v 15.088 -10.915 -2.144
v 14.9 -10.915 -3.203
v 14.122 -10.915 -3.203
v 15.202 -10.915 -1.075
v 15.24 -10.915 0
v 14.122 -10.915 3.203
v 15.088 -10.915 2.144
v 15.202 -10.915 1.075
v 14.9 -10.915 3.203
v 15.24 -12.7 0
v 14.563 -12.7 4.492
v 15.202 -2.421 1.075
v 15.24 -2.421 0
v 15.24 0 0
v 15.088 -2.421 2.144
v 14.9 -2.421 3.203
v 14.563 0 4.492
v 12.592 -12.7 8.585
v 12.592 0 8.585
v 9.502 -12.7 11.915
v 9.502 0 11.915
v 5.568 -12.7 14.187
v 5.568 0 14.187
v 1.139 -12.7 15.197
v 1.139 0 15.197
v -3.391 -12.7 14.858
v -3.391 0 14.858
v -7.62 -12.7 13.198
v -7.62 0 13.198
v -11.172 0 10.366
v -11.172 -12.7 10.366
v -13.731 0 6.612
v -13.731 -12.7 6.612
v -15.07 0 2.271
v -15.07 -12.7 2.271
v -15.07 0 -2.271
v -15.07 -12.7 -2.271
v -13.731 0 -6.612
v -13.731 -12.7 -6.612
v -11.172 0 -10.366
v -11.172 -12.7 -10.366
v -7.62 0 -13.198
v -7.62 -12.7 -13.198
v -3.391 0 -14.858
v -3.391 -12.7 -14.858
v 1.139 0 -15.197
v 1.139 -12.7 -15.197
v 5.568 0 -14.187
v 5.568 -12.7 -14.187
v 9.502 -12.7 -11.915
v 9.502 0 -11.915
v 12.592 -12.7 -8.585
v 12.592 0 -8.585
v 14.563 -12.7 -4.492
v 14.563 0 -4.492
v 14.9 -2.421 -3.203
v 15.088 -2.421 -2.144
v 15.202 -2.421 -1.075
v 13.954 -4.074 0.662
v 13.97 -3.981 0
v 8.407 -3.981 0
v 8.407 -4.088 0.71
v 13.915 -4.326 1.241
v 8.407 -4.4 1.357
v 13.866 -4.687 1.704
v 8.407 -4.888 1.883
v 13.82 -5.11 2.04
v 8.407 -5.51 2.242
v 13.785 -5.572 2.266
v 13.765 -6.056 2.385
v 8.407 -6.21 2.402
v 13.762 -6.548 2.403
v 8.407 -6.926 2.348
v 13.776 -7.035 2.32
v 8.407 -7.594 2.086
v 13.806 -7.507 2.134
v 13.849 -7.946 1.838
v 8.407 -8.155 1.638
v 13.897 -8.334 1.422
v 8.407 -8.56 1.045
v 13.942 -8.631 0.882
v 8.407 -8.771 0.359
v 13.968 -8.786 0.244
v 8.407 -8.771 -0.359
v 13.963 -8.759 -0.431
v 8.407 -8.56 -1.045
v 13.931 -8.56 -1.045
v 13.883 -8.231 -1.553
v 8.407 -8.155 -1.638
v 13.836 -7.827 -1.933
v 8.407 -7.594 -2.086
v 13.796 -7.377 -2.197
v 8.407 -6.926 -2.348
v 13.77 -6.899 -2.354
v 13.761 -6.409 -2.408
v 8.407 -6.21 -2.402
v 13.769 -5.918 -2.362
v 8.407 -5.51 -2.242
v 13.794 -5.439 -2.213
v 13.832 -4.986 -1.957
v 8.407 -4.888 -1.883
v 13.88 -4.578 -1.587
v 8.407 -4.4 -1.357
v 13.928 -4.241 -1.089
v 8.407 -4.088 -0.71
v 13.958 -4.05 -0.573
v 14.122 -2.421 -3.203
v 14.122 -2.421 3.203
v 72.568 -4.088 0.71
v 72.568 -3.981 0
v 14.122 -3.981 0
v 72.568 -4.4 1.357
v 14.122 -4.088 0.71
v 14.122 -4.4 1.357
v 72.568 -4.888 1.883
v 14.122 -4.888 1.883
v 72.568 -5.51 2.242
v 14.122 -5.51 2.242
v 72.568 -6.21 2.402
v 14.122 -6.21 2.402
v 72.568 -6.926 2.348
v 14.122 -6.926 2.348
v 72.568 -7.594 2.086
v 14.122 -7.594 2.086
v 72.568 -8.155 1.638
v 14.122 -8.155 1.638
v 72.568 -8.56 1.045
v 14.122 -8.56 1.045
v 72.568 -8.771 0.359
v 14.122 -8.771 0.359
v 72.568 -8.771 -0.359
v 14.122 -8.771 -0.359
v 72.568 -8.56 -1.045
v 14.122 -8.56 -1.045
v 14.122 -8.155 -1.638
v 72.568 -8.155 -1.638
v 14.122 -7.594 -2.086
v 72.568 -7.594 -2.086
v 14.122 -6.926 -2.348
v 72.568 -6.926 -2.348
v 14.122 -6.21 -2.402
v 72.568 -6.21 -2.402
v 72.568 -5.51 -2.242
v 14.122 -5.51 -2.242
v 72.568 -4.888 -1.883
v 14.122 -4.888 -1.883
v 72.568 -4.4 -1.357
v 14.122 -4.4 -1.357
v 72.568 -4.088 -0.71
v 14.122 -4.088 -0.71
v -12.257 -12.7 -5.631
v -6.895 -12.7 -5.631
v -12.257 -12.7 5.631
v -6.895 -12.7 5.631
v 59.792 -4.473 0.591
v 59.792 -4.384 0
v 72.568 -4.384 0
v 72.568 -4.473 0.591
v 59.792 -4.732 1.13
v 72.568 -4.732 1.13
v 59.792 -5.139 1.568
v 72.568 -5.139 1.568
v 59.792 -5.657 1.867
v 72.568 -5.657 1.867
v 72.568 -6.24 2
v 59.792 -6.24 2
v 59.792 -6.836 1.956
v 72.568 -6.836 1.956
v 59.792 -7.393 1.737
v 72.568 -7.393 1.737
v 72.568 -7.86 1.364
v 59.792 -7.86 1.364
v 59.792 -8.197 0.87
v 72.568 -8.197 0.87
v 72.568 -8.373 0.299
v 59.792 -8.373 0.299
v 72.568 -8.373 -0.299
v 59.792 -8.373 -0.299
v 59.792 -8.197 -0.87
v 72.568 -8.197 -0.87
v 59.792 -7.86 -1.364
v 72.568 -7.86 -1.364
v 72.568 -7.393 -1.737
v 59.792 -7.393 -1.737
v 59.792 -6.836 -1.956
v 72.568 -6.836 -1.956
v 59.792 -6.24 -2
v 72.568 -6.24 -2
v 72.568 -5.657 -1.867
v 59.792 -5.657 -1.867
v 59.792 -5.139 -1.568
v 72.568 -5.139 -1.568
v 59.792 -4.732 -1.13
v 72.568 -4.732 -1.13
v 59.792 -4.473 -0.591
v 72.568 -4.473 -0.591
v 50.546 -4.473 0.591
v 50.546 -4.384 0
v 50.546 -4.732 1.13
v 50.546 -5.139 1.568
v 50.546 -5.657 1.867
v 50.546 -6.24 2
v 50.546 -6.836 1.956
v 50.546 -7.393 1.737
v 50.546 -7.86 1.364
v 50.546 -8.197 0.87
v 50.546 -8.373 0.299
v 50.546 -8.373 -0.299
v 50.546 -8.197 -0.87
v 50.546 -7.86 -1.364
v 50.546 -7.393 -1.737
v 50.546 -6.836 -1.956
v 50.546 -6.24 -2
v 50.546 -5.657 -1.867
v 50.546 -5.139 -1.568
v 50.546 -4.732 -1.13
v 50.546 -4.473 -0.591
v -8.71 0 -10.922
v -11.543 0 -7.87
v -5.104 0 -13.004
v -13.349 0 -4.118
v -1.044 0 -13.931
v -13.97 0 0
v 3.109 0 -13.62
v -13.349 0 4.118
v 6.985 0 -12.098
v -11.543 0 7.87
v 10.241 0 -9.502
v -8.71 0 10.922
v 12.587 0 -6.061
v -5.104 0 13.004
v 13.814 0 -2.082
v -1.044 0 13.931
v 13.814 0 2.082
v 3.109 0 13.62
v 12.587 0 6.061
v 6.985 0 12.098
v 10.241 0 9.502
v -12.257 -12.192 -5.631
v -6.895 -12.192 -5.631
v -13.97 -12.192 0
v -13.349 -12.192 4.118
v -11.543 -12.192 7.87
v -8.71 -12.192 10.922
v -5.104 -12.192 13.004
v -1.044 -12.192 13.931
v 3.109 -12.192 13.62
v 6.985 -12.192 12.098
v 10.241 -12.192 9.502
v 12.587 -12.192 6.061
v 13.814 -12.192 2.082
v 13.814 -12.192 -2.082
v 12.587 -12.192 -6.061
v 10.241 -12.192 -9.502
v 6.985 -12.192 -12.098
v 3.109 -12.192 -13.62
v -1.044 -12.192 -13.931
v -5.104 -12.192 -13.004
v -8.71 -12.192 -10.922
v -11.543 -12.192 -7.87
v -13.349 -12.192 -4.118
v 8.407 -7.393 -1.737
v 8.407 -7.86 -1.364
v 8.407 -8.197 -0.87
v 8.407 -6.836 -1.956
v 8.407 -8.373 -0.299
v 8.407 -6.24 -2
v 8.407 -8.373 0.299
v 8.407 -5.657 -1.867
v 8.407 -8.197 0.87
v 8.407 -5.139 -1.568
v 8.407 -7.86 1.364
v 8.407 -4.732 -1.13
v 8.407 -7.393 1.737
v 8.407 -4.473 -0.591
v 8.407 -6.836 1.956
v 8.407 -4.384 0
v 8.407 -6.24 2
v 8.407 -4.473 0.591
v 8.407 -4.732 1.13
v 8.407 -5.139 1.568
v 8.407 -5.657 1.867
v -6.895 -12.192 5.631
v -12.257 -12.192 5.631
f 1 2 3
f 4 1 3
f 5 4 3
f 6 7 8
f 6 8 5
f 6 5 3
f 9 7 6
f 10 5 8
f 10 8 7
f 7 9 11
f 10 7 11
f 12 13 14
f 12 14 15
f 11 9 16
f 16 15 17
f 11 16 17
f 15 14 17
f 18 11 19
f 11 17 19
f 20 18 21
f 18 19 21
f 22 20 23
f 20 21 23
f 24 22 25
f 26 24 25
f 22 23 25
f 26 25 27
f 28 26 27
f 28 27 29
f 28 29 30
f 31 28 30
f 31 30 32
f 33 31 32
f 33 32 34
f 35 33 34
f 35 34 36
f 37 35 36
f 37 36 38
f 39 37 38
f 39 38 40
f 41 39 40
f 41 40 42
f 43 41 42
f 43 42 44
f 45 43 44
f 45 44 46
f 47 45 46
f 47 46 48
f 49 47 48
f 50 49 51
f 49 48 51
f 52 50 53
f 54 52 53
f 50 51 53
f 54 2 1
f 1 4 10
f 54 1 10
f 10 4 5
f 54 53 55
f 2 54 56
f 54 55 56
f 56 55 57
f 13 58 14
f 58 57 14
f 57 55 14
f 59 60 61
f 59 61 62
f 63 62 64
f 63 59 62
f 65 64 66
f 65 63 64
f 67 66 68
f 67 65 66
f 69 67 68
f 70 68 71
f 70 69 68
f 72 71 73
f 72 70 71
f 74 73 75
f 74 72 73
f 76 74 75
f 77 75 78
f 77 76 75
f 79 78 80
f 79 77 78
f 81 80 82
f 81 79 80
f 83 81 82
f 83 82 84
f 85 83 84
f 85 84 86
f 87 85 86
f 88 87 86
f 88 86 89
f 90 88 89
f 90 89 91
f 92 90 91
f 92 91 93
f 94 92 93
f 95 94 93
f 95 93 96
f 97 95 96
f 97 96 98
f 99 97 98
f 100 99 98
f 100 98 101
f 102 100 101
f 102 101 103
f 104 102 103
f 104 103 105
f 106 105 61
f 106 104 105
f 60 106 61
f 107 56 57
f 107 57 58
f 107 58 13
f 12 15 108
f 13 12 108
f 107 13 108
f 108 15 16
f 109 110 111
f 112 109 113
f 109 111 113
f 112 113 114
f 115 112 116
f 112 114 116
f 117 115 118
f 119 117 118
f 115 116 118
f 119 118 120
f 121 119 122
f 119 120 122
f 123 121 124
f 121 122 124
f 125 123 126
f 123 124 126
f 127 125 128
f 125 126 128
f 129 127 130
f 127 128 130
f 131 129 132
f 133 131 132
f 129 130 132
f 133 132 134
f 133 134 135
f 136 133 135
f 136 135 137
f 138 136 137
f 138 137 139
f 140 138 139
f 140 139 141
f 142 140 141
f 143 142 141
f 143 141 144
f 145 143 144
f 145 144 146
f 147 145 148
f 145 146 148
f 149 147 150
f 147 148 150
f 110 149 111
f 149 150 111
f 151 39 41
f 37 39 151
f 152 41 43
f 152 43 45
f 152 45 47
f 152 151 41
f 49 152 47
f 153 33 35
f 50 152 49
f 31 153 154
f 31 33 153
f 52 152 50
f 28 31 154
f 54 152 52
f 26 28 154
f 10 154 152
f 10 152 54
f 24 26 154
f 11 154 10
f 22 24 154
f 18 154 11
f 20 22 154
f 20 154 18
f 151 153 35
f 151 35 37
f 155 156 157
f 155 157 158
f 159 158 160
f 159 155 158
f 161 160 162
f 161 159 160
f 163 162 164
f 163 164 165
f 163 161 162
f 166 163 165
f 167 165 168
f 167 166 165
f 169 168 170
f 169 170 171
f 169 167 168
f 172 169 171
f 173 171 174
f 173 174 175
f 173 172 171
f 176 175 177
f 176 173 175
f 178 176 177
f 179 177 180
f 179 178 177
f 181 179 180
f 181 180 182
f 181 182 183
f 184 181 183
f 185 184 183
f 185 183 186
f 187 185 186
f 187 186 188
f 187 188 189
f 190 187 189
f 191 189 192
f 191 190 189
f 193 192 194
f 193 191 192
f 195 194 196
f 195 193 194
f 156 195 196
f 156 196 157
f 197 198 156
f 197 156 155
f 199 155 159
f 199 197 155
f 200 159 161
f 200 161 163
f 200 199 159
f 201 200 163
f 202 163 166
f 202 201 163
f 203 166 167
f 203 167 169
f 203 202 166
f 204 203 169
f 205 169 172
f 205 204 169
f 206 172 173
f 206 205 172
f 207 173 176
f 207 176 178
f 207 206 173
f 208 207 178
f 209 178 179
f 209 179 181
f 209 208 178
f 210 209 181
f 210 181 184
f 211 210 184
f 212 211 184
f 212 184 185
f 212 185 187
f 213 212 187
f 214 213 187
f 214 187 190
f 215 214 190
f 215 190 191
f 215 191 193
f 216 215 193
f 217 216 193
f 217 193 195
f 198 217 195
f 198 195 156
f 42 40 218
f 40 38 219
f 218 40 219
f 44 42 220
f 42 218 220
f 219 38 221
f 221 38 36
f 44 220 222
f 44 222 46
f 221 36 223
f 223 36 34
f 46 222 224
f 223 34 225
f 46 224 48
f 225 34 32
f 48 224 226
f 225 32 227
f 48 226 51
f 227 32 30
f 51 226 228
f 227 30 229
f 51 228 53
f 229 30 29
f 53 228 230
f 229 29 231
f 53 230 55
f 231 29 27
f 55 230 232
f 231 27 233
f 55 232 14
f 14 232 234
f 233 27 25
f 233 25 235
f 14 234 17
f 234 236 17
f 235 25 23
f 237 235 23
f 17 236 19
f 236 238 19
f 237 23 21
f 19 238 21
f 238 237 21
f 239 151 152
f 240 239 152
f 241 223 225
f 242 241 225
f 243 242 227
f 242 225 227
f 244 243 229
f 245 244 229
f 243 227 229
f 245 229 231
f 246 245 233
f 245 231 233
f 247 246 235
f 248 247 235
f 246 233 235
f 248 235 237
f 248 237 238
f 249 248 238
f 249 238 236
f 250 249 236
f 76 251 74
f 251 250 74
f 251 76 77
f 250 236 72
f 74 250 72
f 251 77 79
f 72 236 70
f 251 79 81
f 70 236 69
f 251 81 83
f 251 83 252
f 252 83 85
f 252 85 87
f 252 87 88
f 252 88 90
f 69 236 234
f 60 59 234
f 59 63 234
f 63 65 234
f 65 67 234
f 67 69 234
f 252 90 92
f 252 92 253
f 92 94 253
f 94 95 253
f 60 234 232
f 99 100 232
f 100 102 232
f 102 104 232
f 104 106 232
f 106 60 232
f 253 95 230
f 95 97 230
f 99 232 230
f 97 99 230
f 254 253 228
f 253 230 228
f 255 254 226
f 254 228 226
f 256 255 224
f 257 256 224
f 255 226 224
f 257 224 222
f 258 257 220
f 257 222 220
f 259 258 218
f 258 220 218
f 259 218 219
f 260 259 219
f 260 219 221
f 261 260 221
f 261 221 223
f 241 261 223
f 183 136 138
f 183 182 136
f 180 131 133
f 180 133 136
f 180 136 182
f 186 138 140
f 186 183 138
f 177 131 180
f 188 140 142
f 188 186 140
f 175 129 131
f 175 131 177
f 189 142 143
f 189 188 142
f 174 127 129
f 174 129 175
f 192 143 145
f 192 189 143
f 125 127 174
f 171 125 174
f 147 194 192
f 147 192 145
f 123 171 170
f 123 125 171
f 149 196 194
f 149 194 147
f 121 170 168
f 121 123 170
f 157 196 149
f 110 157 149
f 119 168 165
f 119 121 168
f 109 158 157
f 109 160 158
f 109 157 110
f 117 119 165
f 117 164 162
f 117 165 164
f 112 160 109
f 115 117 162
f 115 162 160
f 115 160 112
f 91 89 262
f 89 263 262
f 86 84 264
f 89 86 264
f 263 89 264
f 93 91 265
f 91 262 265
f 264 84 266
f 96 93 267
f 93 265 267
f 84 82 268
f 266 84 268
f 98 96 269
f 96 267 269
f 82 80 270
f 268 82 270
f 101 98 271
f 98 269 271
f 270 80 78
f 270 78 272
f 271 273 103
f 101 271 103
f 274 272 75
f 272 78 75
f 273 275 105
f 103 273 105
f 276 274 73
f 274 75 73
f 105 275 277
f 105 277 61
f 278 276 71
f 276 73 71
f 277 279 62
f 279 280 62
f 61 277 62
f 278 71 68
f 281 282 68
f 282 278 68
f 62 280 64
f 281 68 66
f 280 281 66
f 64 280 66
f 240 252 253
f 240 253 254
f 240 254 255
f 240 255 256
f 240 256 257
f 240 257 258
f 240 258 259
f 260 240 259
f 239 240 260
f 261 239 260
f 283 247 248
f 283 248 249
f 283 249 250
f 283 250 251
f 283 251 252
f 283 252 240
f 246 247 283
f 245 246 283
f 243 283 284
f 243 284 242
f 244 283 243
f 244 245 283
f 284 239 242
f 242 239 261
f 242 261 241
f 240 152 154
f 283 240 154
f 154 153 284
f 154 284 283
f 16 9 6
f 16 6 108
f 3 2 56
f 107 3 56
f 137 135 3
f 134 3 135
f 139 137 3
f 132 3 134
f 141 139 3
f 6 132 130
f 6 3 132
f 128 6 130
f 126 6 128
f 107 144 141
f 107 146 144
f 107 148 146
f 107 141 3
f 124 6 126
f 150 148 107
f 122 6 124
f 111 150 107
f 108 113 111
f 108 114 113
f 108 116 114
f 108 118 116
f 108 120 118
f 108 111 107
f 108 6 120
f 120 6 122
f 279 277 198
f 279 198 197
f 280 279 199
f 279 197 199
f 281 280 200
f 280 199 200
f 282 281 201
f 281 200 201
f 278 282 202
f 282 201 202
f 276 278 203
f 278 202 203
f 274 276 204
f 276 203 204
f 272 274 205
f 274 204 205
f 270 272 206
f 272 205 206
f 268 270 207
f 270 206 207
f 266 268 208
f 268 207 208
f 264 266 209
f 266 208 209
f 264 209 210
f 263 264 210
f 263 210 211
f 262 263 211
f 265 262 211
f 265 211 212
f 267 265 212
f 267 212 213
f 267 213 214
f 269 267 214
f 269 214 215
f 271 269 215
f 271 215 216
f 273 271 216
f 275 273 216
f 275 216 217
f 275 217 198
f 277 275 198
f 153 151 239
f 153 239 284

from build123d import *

# Parameters (mm, degrees)
F0_R      = 15.24
F1_DEPTH  = 12.7
F2_R      = 13.97
F3_DEPTH  = 12.192
F5_W      = 8.4936562926
F5_H      = 6.4059169963
F6_DEPTH  = 17.6276
F7_R      = 2.4085601445
F8_DEPTH  = 23.3426
F9_DEPTH  = 18.796
F10_R     = 2.0058104165
F11_DEPTH = 43.6118
F12_R     = 2.4085601445
F12_R_2   = 2.0058104165
F13_DEPTH = 25.4
F14_DEPTH = 16.1544
F15_DEPTH = 12.7762
F16_W     = 5.3624128923
F16_H     = 11.2610673532
F17_DEPTH = 25.4


with BuildPart() as f1:
    # F0 (on Front) → F1 (new body)
    with BuildSketch(Plane.XZ):
        Circle(F0_R)
    extrude(amount=F1_DEPTH)

    # F2 (on face) → F3 (cut)
    with BuildSketch(Plane(origin=(0, 0, 0), x_dir=(-1, 0, 0), z_dir=(0, 1, 0))):
        Circle(F2_R)
    extrude(amount=-F3_DEPTH, mode=Mode.SUBTRACT)

    # F5 (on offset) → F6 (cut)
    with BuildSketch(Plane.YZ.offset(31.75)):
        with Locations((-6.6680489108, 0)):
            Rectangle(F5_W, F5_H)
    extrude(amount=-F6_DEPTH, mode=Mode.SUBTRACT)

    # F7 (on offset) → F8 (join)
    with BuildSketch(Plane.YZ.offset(31.75)):
        with Locations((-6.3897143118, 0)):
            Circle(F7_R)
    extrude(amount=-F8_DEPTH)

    # F9 (add): a face of the model
    f9_faces = [f1.faces().sort_by_distance(p)[0] for p in [
        (31.75, -6.3897143118, 0),
    ]]
    extrude(f9_faces, amount=F9_DEPTH)

    # F10 (on face) → F11 (cut)
    with BuildSketch(Plane.YZ.offset(50.546)):
        with Locations((-6.3897143118, 0)):
            Circle(F10_R)
    extrude(amount=-F11_DEPTH, mode=Mode.SUBTRACT)

    # F12 (on face) → F13 (join)
    with BuildSketch(Plane.YZ.offset(50.546)):
        with Locations((-6.3897143118, 0)):
            Circle(F12_R)
        with Locations((-6.3897143118, 0)):
            Circle(F12_R_2, mode=Mode.SUBTRACT)
    extrude(amount=F13_DEPTH)

    # F14 (cut): a face of the model
    f14_faces = [f1.faces().sort_by_distance(p)[0] for p in [
        (75.946, -8.7301500879, 0),
    ]]
    extrude(f14_faces, amount=-F14_DEPTH, mode=Mode.SUBTRACT)

    # F15 (add): a face of the model
    f15_faces = [f1.faces().sort_by_distance(p)[0] for p in [
        (59.7916, -8.7301500879, 0),
    ]]
    extrude(f15_faces, amount=F15_DEPTH)

    # F16 (on face) → F17 (cut)
    with BuildSketch(Plane.XZ.offset(12.7)):
        with Locations((-9.5757367089, 0)):
            Rectangle(F16_W, F16_H)
    extrude(amount=-F17_DEPTH, mode=Mode.SUBTRACT)


solid = f1.part
